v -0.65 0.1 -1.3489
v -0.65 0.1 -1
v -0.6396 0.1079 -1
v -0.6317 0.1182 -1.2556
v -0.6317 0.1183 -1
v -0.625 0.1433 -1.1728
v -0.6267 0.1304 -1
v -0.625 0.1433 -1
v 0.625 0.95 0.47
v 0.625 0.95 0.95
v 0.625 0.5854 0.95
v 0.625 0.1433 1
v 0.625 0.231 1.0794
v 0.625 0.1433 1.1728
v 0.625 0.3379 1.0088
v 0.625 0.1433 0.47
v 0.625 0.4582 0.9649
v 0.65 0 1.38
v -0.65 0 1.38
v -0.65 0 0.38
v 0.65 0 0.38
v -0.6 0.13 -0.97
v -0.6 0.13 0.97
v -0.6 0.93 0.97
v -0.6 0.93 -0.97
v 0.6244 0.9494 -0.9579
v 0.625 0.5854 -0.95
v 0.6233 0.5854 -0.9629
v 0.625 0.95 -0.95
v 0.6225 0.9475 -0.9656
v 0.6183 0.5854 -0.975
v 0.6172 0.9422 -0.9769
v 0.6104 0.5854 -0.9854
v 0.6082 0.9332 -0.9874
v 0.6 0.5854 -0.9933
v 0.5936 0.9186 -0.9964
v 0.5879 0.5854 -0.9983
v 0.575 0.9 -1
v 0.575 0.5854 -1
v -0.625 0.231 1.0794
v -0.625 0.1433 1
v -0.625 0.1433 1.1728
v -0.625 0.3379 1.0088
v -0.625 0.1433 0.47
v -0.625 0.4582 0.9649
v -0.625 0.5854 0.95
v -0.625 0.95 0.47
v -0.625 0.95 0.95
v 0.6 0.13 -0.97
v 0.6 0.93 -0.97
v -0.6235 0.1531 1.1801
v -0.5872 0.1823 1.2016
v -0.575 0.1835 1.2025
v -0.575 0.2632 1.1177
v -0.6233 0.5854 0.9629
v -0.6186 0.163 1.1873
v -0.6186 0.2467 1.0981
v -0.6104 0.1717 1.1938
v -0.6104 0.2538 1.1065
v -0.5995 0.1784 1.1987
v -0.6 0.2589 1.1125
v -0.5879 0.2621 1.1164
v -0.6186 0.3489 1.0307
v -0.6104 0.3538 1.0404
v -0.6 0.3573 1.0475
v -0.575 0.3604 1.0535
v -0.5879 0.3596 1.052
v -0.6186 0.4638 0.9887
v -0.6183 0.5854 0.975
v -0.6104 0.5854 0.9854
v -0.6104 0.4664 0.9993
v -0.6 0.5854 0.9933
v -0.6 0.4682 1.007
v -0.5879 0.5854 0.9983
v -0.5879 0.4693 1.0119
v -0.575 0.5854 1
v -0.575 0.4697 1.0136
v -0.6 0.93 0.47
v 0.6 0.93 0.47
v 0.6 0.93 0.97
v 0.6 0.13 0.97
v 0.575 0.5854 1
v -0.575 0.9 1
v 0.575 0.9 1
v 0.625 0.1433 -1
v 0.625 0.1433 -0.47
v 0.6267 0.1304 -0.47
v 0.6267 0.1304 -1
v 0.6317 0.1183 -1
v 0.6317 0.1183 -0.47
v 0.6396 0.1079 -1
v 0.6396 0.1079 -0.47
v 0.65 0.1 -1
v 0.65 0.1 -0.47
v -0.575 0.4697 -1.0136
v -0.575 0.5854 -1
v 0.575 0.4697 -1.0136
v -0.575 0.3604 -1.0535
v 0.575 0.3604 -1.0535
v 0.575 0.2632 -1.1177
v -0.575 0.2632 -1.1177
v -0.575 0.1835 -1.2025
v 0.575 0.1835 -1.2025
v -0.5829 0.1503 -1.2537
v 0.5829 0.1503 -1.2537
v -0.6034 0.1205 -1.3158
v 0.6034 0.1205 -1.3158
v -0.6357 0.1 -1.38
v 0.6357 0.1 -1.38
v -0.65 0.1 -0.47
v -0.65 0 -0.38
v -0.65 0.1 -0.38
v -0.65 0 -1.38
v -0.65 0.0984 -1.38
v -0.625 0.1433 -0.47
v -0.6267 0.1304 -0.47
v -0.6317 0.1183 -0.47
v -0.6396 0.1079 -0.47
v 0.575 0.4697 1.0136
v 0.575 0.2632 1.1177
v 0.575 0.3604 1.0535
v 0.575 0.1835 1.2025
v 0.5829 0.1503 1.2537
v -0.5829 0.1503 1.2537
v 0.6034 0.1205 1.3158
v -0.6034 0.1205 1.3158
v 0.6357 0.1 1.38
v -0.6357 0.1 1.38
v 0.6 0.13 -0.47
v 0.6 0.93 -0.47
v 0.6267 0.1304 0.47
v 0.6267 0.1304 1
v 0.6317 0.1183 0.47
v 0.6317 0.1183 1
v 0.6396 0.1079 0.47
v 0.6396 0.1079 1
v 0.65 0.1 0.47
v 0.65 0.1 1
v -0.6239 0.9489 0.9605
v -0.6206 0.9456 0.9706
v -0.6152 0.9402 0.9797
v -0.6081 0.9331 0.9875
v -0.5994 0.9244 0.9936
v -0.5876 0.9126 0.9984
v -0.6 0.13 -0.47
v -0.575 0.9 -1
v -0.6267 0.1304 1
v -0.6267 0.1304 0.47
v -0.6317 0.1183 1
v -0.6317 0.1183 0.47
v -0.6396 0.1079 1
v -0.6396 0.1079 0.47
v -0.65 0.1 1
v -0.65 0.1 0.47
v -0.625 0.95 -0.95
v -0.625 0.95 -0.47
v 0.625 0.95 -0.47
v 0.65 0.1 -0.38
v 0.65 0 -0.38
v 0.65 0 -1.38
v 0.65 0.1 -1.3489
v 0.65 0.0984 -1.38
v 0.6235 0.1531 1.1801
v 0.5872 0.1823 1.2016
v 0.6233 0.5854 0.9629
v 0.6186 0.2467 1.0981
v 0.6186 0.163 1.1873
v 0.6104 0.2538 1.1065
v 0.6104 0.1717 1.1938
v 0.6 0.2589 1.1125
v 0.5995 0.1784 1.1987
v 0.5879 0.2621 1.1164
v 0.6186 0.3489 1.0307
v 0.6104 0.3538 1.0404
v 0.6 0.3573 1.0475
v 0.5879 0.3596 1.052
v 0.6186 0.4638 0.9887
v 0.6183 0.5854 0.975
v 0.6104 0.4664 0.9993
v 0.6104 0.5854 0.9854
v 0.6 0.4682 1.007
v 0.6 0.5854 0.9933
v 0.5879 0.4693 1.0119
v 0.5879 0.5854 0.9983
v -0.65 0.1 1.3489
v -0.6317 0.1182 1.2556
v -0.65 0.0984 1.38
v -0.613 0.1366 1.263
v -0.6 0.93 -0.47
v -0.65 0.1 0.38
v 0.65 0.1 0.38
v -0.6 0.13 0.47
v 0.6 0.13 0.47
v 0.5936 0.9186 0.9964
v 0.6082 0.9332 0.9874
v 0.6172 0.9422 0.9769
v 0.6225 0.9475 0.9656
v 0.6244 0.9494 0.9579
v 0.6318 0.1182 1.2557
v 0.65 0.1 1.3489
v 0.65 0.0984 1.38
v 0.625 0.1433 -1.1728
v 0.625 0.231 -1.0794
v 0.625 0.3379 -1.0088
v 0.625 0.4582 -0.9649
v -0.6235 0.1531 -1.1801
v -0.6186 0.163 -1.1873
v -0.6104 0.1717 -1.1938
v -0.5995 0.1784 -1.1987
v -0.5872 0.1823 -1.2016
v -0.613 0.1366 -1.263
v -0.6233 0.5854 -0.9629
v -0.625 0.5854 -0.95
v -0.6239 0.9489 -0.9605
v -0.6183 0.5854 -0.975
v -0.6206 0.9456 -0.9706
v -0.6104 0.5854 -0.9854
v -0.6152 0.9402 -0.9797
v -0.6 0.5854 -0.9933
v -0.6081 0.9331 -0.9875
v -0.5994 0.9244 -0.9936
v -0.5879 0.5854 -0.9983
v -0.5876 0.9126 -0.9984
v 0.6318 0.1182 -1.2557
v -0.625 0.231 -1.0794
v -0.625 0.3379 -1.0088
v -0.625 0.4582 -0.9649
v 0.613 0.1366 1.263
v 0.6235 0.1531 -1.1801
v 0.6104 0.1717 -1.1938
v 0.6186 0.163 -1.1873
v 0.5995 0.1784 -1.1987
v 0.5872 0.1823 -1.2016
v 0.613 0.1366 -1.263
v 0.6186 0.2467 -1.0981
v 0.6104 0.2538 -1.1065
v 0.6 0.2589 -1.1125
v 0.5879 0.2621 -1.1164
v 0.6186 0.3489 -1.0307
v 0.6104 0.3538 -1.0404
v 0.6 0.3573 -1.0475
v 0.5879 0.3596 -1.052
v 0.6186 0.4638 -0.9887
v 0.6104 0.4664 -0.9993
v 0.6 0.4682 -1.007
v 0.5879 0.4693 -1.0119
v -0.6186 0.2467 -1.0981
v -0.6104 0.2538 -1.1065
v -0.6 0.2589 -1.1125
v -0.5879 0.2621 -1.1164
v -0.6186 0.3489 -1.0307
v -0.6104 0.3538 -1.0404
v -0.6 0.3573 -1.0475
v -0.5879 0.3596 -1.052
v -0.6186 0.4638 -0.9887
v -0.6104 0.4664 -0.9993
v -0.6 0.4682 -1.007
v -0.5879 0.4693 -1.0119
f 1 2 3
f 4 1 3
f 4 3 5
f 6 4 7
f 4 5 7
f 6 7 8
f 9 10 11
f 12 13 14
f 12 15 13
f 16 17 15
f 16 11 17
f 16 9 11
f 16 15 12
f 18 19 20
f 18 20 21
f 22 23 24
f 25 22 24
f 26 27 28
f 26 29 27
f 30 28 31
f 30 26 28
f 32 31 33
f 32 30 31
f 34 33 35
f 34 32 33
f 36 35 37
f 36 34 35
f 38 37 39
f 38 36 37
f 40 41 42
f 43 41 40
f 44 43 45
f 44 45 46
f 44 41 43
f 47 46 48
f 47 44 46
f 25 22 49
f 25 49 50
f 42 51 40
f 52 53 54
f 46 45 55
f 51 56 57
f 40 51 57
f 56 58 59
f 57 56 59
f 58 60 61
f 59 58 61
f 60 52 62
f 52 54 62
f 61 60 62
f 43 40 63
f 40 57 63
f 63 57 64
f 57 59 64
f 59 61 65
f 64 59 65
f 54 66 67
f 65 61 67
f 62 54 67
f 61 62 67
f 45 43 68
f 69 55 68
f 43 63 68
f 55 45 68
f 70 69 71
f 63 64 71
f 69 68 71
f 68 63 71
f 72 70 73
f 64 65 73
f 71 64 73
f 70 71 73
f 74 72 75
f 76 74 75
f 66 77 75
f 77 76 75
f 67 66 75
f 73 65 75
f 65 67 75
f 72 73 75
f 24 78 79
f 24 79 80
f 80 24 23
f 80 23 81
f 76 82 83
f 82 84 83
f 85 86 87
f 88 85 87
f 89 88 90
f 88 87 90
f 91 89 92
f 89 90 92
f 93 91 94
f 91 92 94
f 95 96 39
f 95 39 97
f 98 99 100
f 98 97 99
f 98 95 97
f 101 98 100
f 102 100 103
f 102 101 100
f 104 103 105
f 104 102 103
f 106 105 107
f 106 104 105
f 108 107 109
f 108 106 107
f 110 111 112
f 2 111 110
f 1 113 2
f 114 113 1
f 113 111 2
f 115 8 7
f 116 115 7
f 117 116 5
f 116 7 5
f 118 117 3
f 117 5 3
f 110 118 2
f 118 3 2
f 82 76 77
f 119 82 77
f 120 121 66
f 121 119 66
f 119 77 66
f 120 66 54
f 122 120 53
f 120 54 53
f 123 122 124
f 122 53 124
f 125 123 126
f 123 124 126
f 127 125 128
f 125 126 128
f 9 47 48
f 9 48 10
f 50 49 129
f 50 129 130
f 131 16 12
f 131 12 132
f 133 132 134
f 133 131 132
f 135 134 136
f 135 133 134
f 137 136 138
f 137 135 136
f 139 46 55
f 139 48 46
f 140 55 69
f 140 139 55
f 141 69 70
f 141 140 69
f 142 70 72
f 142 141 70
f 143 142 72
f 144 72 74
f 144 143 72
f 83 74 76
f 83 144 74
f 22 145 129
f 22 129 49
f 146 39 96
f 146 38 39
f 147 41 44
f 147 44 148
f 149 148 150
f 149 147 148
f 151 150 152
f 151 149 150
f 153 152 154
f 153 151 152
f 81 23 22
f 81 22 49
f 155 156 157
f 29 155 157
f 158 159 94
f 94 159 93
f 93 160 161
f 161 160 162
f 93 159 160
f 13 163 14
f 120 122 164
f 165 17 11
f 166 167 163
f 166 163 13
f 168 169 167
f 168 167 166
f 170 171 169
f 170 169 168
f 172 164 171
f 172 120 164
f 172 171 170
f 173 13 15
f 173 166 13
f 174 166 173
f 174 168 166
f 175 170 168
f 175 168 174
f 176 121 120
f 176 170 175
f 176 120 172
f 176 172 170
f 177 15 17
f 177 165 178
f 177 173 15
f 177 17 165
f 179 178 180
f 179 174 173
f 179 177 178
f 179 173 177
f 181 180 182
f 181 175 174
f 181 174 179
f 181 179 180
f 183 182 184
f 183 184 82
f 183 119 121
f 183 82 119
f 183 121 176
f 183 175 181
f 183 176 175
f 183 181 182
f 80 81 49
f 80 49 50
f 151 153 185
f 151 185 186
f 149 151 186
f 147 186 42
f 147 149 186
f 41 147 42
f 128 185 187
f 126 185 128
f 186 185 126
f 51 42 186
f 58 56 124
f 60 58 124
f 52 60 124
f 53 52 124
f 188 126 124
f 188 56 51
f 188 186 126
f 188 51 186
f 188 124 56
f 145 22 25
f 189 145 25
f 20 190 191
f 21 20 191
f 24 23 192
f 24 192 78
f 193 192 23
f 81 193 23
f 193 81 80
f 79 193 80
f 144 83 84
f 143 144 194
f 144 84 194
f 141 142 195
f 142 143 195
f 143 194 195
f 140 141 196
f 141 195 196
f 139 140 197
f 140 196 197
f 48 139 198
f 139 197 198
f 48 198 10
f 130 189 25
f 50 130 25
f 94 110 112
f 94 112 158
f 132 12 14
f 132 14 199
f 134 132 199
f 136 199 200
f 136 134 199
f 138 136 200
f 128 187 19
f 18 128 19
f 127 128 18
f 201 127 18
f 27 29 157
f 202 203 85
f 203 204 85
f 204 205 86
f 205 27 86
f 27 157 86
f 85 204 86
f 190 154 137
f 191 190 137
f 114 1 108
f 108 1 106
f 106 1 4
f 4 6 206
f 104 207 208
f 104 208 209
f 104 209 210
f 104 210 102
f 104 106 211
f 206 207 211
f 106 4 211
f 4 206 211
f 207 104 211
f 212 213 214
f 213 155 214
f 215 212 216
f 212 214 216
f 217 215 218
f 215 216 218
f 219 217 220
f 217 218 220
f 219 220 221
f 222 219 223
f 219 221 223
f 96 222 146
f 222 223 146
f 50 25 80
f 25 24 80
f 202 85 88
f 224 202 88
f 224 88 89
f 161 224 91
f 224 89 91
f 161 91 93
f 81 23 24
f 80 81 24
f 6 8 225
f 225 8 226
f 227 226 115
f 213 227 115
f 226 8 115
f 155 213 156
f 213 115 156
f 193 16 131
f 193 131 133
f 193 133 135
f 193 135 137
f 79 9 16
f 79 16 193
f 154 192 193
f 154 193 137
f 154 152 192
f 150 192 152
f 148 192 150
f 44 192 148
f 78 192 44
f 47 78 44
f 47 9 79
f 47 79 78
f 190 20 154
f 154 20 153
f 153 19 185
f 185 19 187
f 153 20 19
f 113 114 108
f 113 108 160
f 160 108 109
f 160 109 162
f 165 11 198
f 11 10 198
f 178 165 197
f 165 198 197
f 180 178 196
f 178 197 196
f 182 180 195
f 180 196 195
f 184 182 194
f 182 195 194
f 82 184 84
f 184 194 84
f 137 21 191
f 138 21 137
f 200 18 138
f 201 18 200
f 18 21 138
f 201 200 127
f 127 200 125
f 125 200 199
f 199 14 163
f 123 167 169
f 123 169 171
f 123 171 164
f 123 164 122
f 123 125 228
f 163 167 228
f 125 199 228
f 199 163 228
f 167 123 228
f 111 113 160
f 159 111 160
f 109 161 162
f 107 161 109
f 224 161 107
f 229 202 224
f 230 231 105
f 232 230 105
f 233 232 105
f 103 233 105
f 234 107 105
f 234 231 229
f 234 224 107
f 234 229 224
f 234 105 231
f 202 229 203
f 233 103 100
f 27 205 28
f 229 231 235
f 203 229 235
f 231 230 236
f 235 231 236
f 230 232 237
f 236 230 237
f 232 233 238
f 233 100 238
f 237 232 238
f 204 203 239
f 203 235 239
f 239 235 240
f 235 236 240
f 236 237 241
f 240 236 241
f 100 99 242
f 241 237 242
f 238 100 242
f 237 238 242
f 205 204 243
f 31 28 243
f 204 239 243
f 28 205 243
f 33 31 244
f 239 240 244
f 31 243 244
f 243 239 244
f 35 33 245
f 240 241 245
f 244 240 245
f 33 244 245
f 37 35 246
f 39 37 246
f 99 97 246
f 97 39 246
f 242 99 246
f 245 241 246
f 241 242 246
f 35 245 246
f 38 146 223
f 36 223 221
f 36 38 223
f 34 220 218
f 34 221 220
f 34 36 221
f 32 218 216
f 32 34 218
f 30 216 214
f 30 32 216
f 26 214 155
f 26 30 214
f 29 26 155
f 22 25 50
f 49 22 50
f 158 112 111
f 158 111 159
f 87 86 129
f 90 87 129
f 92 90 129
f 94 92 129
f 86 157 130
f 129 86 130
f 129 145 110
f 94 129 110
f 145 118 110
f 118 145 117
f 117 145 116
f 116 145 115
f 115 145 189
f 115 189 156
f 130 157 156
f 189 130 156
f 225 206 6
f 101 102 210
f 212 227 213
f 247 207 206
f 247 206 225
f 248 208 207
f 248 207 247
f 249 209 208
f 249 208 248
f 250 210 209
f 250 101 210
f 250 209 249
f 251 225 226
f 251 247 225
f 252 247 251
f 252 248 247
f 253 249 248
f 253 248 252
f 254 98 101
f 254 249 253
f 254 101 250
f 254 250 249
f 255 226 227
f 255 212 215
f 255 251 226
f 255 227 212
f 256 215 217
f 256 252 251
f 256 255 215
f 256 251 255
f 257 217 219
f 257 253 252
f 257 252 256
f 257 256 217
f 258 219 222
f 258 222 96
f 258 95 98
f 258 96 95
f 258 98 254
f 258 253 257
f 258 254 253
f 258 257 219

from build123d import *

# Parameters (mm, degrees)
SKETCH1_W                = 1.2
SKETCH1_H                = 0.8
BOSS_EXTRUDE1_DEPTH      = 0.97
BOSS_EXTRUDE2_DEPTH      = 0.03
BOSS_EXTRUDE2_DEPTH_BACK = 0.5
SKETCH2_W                = 1.25
SKETCH2_H                = 0.85
INDENT1_START            = -0.6
INDENT1_OUTLINE_W        = 0.8
INDENT1_OUTLINE_H        = 0.5
INDENT1_DEPTH            = 1.2
SKETCH3_W                = 1.3
SKETCH3_H                = 1
BOSS_EXTRUDE3_DEPTH      = 0.1
FILLET1_R                = 0.05
FILLET2_START            = -0.6500001
FILLET2_DEPTH            = 1.3000001
FILLET2_START_2          = 1
FILLET2_2_DEPTH          = 1
FILLET3_R                = 0.05


with BuildPart() as part:
    # Sketch1 → Boss-Extrude1 (new, symmetric)
    with BuildSketch(Plane.XY):
        with Locations((0, 0.53)):
            Rectangle(SKETCH1_W, SKETCH1_H)
    extrude(amount=BOSS_EXTRUDE1_DEPTH, both=True)


with BuildPart() as body_2:
    # Sketch2 → Boss-Extrude2 (new, two sides: drawn at the far end of the back side and taken through both)
    with BuildSketch(Plane.XY.offset(0.97).offset(-BOSS_EXTRUDE2_DEPTH_BACK)):
        with Locations((0, 0.525)):
            Rectangle(SKETCH2_W, SKETCH2_H)
    extrude(amount=BOSS_EXTRUDE2_DEPTH + BOSS_EXTRUDE2_DEPTH_BACK)

    # Indent1: read off the stored shape, not the designer's step
    # Indent1 outline → Indent1 (cut)
    with BuildSketch(Plane.YZ.offset(INDENT1_START)):
        with Locations((0.53, 0.72)):
            Rectangle(INDENT1_OUTLINE_W, INDENT1_OUTLINE_H)
    extrude(amount=INDENT1_DEPTH, mode=Mode.SUBTRACT)

    # Sketch3 → Boss-Extrude3 (add)
    with BuildSketch(Plane.XZ.offset(-0.1)):
        with Locations((0, 0.88)):
            Rectangle(SKETCH3_W, SKETCH3_H)
    extrude(amount=BOSS_EXTRUDE3_DEPTH)

    # Fillet1
    # the kernel refuses this fillet: 0.05 mm, written as the material it adds along each edge
    with BuildSketch(Plane(origin=(0.625, 0.1, 0.47), x_dir=(1, 0, 0), z_dir=(0, 0, 1)), Plane(origin=(-0.625, 0.1, 1), x_dir=(-1, 0, 0), z_dir=(0, 0, -1))) as fillet1_piece_1:
        with BuildLine():
            CenterArc((0.05, 0.04330127), FILLET1_R, 180, 60)
            Line((0, 0.04330127), (-0.001, 0.04330127))
            Line((-0.001, 0.04330127), (-0.001, 0))
            Line((-0.001, 0), (0, -0.001))
            ThreePointArc((0, -0.001), (0.0125, -0.001), (0.0245, -0.000866025))
            Line((0.0245, -0.000866025), (0.025, 0))
        make_face()
    extrude(amount=0.53)

    # Fillet2: read off the stored shape, not the designer's step
    # Fillet2 outline → Fillet2 (add)
    with BuildSketch(Plane.YZ.offset(FILLET2_START)):
        with BuildLine():
            ThreePointArc((0.585386444, 1), (0.277165744, 1.106299606), (0.1, 1.38))
            Line((0.1, 1.38), (0.1, 1))
            Line((0.1, 1), (0.585386444, 1))
        make_face()
    extrude(amount=FILLET2_DEPTH)

    # Fillet2 2 outline → Fillet2 2 (cut)
    with BuildSketch(Plane.XY.offset(FILLET2_START_2)):
        with BuildLine():
            Line((0.625, 2), (0.625, 0.14330127))
            ThreePointArc((0.625, 0.14330127), (0.63169873, 0.11830127), (0.65, 0.1))
            Line((0.65, 0.1), (0.65, 2))
            Line((0.65, 2), (0.625, 2))
        make_face()
        with BuildLine():
            Line((-0.625, 0.14330127), (-0.625, 2))
            Line((-0.625, 2), (-0.65, 2))
            Line((-0.65, 2), (-0.65, 0.1))
            ThreePointArc((-0.65, 0.1), (-0.63169873, 0.11830127), (-0.625, 0.14330127))
        make_face()
    extrude(amount=FILLET2_2_DEPTH, mode=Mode.SUBTRACT)

    # Fillet3
    fillet3_edges = [body_2.edges().sort_by_distance(p)[0] for p in [
        (-0.625, 0.767693222, 1),
        (0, 0.95, 1),
        (0.625, 0.767693222, 1),
        (0.625, 0.327308121, 1.071752899),
        (0.631998085, 0.117789797, 1.322931157),
        (-0.631998085, 0.117789797, 1.322931157),
        (-0.625, 0.327308121, 1.071752899),
    ]]
    fillet(fillet3_edges, radius=FILLET3_R)


with BuildPart() as body_3:
    # Mirror1: mirrored copy
    add(body_2.part.mirror(Plane.XY))


solid = Compound([part.part, body_2.part, body_3.part])
